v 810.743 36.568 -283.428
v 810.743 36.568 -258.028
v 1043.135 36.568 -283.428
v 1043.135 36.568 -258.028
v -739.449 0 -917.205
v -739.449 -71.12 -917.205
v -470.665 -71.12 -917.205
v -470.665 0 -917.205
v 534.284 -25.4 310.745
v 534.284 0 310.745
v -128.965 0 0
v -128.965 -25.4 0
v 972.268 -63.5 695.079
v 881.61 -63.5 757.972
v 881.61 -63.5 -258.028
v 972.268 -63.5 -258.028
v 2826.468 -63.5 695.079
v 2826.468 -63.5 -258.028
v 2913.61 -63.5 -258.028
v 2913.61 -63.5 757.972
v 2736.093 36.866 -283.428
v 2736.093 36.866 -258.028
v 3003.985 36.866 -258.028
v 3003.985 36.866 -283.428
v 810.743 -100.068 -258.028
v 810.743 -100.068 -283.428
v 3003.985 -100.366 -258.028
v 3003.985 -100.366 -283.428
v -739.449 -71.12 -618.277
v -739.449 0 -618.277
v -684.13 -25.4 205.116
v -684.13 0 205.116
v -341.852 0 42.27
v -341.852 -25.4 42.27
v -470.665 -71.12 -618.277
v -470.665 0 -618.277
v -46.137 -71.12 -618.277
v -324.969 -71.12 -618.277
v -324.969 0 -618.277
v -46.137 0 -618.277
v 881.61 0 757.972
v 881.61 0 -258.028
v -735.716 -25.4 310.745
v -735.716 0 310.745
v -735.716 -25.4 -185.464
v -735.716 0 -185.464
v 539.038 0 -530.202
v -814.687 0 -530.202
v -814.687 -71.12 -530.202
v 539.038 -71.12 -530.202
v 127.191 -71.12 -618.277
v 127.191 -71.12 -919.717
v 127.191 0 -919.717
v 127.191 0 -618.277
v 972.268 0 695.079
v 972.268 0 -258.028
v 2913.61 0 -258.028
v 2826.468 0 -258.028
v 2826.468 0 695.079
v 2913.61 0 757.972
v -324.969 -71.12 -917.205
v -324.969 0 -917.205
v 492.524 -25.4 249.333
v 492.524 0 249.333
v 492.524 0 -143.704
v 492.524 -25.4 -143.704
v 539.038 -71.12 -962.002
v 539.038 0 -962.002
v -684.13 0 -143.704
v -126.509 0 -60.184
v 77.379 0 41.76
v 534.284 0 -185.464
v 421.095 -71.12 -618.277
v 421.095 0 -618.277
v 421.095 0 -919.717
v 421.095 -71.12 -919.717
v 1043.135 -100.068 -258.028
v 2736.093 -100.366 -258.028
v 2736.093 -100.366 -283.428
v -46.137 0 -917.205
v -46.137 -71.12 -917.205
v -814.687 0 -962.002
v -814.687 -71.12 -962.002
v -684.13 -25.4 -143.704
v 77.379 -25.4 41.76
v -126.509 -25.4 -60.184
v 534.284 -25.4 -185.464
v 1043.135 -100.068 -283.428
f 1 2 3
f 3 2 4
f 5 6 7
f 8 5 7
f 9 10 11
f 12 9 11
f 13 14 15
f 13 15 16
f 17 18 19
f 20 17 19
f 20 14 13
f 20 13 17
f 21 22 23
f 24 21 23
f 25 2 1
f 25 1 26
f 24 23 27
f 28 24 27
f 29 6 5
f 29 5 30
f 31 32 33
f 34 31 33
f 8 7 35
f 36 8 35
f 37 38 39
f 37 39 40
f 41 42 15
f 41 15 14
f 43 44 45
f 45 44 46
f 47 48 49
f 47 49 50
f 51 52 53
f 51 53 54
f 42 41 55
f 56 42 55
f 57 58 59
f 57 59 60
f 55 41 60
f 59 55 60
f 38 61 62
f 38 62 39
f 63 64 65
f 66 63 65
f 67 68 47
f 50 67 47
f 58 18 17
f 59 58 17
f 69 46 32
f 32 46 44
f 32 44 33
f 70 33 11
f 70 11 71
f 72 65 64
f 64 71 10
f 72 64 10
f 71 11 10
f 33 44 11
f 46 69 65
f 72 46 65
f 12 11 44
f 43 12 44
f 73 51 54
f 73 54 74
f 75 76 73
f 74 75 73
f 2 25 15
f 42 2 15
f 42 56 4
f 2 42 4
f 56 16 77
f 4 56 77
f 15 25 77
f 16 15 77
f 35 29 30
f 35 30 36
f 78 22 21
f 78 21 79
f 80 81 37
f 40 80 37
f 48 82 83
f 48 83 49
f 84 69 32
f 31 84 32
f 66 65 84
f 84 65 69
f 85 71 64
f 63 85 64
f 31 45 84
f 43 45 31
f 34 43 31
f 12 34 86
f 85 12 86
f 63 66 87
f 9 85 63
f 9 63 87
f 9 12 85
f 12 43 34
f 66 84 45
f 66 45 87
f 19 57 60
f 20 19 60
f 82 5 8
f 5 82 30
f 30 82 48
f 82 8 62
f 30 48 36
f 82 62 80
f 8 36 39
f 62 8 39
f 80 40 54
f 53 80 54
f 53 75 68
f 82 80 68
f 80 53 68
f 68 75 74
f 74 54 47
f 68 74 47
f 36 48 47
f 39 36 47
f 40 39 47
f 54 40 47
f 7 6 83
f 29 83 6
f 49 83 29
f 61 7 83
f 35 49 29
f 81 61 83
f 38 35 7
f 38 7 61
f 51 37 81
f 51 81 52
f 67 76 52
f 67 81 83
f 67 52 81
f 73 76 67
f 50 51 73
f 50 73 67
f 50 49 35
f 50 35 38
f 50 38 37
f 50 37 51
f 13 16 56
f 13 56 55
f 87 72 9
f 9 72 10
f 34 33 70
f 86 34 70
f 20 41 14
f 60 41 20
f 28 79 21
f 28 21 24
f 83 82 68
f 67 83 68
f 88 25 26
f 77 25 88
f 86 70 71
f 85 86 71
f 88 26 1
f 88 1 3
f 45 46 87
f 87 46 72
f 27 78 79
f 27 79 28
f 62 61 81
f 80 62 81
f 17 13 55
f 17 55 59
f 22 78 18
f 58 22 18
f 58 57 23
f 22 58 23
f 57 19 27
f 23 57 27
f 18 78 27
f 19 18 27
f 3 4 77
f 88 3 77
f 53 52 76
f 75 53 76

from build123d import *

# Parameters (mm, degrees)
F1_DEPTH  = 25.4
F2_W      = 1353.724718
F2_H      = 431.8
F3_DEPTH  = 71.12
F4_W      = 268.784046
F4_H      = 298.928082
F4_W_2    = 278.832026
F4_W_3    = 293.904052
F4_H_2    = 301.44006
F5_DEPTH  = 132.08
F6_W      = 2032
F6_H      = 1016
F7_DEPTH  = 63.5
F8_W      = 1854.2
F8_H      = 990.6
F9_DEPTH  = 276.86
F10_W     = 232.391596
F10_H     = 136.635338
F11_DEPTH = 25.4
F12_W     = 267.891827
F12_H     = 137.23181
F13_DEPTH = 25.4


with BuildPart() as f1:
    # F0 (on Front) → F1 (new body)
    with BuildSketch(Plane.XZ):
        Polygon((-735.715698, 310.744682), (-735.715698, 249.332691), (-735.715698, -185.464206), (534.284302, -185.464206), (534.284302, 310.744682), (-128.965185, 0), align=None)
        Polygon((-684.129557, -143.704052), (-684.129557, 205.116044), (-341.851855, 42.27026), (-126.508707, -60.183753), (77.379136, 41.760171), (492.524164, 249.332691), (492.524164, -143.704052), (77.379136, -143.704052), (-341.851855, -143.704052), align=None, mode=Mode.SUBTRACT)
    extrude(amount=F1_DEPTH)


with BuildPart() as f3:
    # F2 (on Front) → F3 (new body)
    with BuildSketch(Plane.XZ):
        with Locations((-137.824774, -746.102099)):
            Rectangle(F2_W, F2_H)
    extrude(amount=F3_DEPTH)

    # F4 (on face) → F5 (cut)
    with BuildSketch(Plane.XZ.offset(71.12)):
        with Locations((-605.056822, -767.740756)):
            Rectangle(F4_W, F4_H)
        with Locations((-185.552772, -767.740756)):
            Rectangle(F4_W_2, F4_H)
        with Locations((274.143286, -768.996745)):
            Rectangle(F4_W_3, F4_H_2)
    extrude(amount=-F5_DEPTH, mode=Mode.SUBTRACT)


with BuildPart() as f7:
    # F6 (on Front) → F7 (new body)
    with BuildSketch(Plane.XZ):
        with Locations((1897.610215, 249.972268)):
            Rectangle(F6_W, F6_H)
    extrude(amount=F7_DEPTH)

    # F8 (on face) → F9 (cut)
    with BuildSketch(Plane.XZ.offset(63.5)):
        with Locations((1899.367568, 199.778711)):
            Rectangle(F8_W, F8_H)
    extrude(amount=-F9_DEPTH, mode=Mode.SUBTRACT)

    # F10 (on face) → F11 (join)
    with BuildSketch(Plane(origin=(0, 0, -258.027732), x_dir=(1, 0, 0), z_dir=(0, 0, -1))):
        with Locations((926.938891, 31.75)):
            Rectangle(F10_W, F10_H)
    extrude(amount=F11_DEPTH)

    # F12 (on face) → F13 (join)
    with BuildSketch(Plane(origin=(0, 0, -258.027732), x_dir=(1, 0, 0), z_dir=(0, 0, -1))):
        with Locations((2870.038891, 31.75)):
            Rectangle(F12_W, F12_H)
    extrude(amount=F13_DEPTH)


solid = Compound([f1.part, f3.part, f7.part])
